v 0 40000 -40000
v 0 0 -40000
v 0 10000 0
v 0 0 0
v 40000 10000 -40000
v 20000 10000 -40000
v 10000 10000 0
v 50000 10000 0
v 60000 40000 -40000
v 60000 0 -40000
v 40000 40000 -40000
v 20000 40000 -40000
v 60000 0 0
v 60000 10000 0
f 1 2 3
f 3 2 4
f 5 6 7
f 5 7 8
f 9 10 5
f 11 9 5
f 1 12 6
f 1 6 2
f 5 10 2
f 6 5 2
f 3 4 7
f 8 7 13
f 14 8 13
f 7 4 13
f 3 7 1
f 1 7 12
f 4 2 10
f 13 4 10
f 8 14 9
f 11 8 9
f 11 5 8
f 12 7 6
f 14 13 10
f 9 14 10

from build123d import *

# Parameters (mm, degrees)
BOSS_EXTRUDE1_DEPTH     = 10000
BOSS_EXTRUDE2_DEPTH     = 40000
CUT_EXTRUDE1_DEPTH      = 1
CUT_EXTRUDE1_DEPTH_BACK = 60001


with BuildPart() as part:
    # Sketch1 → Boss-Extrude1 (new body)
    with BuildSketch(Plane(origin=(0, 0, 0), x_dir=(1, 0, 0), z_dir=(0, 1, 0))):
        Polygon((20000, 40000), (10000, 0), (50000, 0), (40000, 40000), align=None)
    extrude(amount=BOSS_EXTRUDE1_DEPTH)

    # Sketch1<3> → Boss-Extrude2 (add)
    with BuildSketch(Plane(origin=(0, 0, 0), x_dir=(1, 0, 0), z_dir=(0, 1, 0))):
        Polygon((40000, 40000), (50000, 0), (60000, 0), (60000, 40000), align=None)
        Polygon((0, 40000), (0, 0), (10000, 0), (20000, 40000), align=None)
    extrude(amount=BOSS_EXTRUDE2_DEPTH)

    # Sketch3 → Cut-Extrude1 (cut, two sides)
    with BuildSketch(Plane(origin=(60000, 0, 0), x_dir=(0, 0, -1), z_dir=(1, 0, 0))) as cut_extrude1_sk:
        Polygon((130517.667991878, 107888.250993909), (40000, 40000), (0, 10000), (-90517.667991878, -57888.250993909), (-226294.169979695, 123147.084989848), (-5258.833995939, 288923.586977665), align=None)
    extrude(amount=CUT_EXTRUDE1_DEPTH, mode=Mode.SUBTRACT)
    extrude(cut_extrude1_sk.sketch, amount=-CUT_EXTRUDE1_DEPTH_BACK, mode=Mode.SUBTRACT)


solid = part.part
